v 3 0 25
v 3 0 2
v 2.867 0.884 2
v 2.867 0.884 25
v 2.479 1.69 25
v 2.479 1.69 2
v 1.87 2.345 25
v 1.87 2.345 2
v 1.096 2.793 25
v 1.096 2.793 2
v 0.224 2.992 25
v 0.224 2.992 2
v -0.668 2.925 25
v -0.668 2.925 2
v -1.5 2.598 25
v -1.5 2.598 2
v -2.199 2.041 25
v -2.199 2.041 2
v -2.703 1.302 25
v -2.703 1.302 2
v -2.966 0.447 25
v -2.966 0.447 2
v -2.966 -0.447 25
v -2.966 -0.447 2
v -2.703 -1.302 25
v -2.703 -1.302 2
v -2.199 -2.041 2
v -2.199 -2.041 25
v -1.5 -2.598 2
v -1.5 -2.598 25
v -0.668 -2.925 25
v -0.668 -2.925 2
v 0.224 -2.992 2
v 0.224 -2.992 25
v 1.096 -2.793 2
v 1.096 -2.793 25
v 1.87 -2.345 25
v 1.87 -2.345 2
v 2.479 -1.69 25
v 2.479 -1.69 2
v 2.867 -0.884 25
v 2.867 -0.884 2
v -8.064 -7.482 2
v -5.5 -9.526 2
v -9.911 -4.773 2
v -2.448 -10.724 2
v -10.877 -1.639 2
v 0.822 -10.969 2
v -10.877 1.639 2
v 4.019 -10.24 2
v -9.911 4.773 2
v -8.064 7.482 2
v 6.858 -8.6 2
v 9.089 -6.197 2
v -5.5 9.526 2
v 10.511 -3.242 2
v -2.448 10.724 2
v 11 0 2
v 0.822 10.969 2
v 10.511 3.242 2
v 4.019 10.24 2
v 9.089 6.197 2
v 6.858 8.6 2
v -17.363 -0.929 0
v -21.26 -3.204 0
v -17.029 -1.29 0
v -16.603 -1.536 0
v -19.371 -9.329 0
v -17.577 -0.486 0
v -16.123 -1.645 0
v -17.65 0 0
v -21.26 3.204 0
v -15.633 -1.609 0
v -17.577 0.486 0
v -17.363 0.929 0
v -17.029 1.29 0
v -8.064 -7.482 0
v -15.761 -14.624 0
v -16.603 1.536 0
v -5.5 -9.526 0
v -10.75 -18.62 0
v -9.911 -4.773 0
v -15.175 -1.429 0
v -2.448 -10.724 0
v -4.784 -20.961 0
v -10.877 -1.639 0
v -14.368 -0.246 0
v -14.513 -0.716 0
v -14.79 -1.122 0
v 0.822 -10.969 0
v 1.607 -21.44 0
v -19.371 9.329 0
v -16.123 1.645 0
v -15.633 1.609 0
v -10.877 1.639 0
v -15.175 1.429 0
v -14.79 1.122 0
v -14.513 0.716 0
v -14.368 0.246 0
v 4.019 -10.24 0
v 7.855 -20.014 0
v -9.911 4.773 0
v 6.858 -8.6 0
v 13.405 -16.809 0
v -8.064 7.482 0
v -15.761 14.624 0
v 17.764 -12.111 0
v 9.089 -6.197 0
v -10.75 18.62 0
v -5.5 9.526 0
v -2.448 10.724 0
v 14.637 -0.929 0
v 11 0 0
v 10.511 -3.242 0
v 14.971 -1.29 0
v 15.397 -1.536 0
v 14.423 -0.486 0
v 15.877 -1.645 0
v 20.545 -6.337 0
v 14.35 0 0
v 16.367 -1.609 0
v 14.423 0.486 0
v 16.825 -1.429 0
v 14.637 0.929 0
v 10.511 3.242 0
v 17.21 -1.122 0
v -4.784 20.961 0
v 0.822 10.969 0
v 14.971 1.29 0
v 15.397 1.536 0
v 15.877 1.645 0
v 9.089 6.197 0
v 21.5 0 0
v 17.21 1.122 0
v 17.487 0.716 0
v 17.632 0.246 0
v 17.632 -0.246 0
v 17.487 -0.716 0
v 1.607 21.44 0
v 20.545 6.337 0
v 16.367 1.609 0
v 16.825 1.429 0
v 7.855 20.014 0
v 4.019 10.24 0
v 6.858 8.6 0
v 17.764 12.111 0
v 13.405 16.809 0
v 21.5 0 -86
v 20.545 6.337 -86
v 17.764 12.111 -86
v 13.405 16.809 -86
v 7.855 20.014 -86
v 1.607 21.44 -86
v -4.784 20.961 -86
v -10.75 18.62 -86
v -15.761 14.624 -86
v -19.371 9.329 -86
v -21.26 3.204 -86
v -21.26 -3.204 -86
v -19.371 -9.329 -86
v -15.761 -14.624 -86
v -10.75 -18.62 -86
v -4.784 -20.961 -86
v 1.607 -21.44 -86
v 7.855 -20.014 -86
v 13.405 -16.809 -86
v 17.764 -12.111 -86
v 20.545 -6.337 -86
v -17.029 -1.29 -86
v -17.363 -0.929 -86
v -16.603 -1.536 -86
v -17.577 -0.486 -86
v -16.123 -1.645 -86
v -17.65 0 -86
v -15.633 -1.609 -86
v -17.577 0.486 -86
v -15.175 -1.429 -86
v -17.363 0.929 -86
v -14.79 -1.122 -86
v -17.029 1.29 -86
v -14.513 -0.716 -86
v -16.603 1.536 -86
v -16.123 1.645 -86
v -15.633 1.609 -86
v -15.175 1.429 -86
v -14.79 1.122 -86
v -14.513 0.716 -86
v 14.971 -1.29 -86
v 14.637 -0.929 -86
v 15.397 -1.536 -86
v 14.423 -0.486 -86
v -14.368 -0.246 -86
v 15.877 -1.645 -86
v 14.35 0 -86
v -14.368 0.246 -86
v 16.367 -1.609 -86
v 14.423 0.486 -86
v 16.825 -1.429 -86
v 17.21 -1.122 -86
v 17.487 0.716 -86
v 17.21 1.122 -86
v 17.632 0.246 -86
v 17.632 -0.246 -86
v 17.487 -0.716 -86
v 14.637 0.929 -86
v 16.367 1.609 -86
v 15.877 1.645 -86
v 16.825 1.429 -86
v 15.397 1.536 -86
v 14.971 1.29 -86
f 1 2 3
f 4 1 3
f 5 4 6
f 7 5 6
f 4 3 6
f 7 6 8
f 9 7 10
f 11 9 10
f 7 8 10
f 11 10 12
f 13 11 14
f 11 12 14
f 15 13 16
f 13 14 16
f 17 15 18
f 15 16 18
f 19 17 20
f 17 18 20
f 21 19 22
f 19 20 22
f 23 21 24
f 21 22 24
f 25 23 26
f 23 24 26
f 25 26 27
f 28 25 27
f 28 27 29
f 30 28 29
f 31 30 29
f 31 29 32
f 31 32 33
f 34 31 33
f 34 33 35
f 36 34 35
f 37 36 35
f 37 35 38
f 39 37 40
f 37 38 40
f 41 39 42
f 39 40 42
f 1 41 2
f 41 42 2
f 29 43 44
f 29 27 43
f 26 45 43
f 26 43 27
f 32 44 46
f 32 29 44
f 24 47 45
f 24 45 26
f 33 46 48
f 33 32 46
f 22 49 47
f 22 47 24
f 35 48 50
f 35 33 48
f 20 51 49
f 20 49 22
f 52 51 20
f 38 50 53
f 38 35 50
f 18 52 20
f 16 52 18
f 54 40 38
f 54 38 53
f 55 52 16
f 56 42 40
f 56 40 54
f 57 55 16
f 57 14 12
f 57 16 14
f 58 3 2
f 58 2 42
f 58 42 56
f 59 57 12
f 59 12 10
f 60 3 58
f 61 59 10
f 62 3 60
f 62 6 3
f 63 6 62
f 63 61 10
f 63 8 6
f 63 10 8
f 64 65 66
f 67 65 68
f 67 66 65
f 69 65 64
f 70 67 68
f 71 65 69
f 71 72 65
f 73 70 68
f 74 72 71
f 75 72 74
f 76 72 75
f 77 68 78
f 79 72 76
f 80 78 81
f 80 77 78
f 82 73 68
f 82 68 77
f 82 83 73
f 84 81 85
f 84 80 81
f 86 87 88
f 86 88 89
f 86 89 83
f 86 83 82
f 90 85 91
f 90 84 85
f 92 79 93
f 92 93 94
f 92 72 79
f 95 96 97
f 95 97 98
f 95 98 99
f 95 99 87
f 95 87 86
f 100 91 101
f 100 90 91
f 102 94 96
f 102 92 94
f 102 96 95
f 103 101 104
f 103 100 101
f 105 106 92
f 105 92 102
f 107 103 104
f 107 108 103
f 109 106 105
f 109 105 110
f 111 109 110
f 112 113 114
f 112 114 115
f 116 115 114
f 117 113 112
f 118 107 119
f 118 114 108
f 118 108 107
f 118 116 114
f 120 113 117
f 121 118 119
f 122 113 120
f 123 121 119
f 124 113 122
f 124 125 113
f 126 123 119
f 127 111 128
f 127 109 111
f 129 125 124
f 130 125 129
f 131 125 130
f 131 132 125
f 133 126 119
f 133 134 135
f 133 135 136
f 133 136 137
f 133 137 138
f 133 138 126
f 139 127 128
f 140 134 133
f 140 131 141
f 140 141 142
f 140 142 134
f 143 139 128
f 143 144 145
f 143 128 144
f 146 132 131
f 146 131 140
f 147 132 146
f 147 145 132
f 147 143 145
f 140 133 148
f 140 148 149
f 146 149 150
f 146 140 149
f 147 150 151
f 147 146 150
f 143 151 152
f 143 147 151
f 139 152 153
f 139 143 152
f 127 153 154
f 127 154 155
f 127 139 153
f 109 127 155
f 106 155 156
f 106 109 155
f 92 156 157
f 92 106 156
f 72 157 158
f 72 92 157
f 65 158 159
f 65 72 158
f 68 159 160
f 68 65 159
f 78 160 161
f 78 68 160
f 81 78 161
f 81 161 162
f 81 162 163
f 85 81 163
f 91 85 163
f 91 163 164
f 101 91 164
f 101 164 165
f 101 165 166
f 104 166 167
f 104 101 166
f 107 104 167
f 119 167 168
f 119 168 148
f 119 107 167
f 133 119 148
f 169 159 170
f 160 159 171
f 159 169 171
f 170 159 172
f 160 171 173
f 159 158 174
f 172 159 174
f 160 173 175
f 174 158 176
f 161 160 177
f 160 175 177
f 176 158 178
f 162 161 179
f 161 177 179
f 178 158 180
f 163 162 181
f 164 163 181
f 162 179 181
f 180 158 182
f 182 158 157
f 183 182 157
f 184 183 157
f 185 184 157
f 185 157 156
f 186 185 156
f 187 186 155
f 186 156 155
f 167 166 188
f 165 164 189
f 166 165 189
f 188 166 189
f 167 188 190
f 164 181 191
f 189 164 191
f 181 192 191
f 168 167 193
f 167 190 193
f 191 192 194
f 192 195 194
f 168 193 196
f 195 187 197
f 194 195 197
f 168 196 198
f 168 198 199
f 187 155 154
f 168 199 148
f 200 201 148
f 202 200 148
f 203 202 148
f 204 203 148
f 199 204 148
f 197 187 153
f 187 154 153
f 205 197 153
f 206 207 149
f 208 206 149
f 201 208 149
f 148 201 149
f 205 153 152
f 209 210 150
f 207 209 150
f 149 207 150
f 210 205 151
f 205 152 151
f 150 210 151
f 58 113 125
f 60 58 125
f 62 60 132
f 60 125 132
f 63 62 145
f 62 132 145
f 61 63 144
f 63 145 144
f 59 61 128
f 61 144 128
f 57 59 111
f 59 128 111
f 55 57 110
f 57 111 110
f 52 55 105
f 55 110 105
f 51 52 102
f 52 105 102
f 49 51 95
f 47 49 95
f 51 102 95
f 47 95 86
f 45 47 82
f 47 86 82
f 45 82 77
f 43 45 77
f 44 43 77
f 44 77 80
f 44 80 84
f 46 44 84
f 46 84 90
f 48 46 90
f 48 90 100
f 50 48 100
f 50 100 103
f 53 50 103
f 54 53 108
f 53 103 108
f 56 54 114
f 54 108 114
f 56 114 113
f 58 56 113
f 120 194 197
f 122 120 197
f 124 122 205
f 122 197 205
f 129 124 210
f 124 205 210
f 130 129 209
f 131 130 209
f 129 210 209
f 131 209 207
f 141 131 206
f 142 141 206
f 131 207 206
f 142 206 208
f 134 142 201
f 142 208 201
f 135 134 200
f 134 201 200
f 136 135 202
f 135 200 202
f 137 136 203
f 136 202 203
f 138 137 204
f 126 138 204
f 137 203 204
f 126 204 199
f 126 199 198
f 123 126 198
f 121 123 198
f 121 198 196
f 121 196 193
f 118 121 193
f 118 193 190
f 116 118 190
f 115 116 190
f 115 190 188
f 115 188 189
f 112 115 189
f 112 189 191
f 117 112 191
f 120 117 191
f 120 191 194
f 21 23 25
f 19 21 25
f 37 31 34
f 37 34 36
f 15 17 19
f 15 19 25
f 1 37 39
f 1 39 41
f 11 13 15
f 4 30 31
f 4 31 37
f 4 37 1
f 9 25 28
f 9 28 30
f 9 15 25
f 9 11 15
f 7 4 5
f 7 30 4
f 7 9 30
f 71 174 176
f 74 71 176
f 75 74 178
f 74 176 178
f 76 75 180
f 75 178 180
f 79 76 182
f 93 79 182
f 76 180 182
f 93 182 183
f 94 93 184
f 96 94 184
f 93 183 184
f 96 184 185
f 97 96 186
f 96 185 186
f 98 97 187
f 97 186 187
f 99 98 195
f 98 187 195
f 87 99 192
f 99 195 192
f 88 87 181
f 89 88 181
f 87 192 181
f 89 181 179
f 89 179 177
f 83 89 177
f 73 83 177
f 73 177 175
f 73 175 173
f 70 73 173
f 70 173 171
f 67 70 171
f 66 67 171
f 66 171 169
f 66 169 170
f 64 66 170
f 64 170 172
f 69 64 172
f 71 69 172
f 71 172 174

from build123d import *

# Parameters (mm, degrees)
F0_R     = 21.5
F1_DEPTH = 86
F2_R     = 11
F3_DEPTH = 2
F4_R     = 3
F5_DEPTH = 23
F7_D     = 3.3


with BuildPart() as f1:
    # F0 (on Top) → F1 (new body)
    with BuildSketch(Plane.XY):
        Circle(F0_R)
    extrude(amount=-F1_DEPTH)

    # F2 (on face) → F3 (join)
    with BuildSketch(Plane.XY):
        Circle(F2_R)
    extrude(amount=F3_DEPTH)

    # F4 (on face) → F5 (join)
    with BuildSketch(Plane.XY.offset(2)):
        Circle(F4_R)
    extrude(amount=F5_DEPTH)

    # F7 (through all)
    with Locations(Plane.XY):
        with Locations((-16, 0), (16, 0)):
            Hole(F7_D / 2)


solid = f1.part
